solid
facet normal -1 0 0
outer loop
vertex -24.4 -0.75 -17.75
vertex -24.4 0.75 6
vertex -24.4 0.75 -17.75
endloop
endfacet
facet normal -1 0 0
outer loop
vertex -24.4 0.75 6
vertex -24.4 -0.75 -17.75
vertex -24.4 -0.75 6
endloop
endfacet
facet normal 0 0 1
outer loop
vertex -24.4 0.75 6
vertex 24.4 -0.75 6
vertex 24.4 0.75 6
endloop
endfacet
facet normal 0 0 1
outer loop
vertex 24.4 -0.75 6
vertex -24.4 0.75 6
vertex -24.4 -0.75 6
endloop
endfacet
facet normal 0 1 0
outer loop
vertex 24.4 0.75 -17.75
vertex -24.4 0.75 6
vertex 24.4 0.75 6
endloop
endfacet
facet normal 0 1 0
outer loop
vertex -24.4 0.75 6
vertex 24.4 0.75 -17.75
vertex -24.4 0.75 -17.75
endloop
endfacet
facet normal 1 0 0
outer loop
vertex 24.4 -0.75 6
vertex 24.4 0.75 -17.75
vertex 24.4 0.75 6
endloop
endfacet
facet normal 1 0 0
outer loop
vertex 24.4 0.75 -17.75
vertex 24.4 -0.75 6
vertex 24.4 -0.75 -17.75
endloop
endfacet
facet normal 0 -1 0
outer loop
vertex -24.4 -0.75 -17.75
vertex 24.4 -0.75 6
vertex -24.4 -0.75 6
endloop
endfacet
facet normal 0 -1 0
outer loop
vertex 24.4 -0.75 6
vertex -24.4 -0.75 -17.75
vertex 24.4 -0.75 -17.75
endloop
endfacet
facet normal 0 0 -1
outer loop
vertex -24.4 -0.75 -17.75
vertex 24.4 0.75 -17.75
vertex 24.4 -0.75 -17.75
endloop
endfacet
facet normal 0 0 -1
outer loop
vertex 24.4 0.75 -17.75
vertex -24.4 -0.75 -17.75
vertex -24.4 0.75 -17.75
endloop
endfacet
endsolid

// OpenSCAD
echo(version=version());

tooth_count = 1; // Number of wells
tooth_width = 48.8; // Width of each tooth
tooth_thickness = 1.5; // Thickness of each tooth
tooth_gap = 1.6; // Spacing between teeth.
tooth_length = 17.75;  // Length of teeth (measured perpendicular from bottom of support)
text_label = "Your Text Here"; // Label or name you want to appear on the side
tooth_support = 6;// Height of upper support on teeth

ladder_width = 5.6;
teeth_length = 57; //Width of the overall comb

union() { 
    // Teeth support  
    translate([0, 0, 0])
    linear_extrude(height = 6) 
    square([(tooth_width*tooth_count)+(tooth_gap*(tooth_count-1)), tooth_thickness], center = true);

// Teeth support  
    translate([0, 0, -tooth_length])
    color("Blue")
    linear_extrude(height = tooth_length) 
    square([(tooth_width*tooth_count)+(tooth_gap*(tooth_count-1)), tooth_thickness], center = true);




    
}
